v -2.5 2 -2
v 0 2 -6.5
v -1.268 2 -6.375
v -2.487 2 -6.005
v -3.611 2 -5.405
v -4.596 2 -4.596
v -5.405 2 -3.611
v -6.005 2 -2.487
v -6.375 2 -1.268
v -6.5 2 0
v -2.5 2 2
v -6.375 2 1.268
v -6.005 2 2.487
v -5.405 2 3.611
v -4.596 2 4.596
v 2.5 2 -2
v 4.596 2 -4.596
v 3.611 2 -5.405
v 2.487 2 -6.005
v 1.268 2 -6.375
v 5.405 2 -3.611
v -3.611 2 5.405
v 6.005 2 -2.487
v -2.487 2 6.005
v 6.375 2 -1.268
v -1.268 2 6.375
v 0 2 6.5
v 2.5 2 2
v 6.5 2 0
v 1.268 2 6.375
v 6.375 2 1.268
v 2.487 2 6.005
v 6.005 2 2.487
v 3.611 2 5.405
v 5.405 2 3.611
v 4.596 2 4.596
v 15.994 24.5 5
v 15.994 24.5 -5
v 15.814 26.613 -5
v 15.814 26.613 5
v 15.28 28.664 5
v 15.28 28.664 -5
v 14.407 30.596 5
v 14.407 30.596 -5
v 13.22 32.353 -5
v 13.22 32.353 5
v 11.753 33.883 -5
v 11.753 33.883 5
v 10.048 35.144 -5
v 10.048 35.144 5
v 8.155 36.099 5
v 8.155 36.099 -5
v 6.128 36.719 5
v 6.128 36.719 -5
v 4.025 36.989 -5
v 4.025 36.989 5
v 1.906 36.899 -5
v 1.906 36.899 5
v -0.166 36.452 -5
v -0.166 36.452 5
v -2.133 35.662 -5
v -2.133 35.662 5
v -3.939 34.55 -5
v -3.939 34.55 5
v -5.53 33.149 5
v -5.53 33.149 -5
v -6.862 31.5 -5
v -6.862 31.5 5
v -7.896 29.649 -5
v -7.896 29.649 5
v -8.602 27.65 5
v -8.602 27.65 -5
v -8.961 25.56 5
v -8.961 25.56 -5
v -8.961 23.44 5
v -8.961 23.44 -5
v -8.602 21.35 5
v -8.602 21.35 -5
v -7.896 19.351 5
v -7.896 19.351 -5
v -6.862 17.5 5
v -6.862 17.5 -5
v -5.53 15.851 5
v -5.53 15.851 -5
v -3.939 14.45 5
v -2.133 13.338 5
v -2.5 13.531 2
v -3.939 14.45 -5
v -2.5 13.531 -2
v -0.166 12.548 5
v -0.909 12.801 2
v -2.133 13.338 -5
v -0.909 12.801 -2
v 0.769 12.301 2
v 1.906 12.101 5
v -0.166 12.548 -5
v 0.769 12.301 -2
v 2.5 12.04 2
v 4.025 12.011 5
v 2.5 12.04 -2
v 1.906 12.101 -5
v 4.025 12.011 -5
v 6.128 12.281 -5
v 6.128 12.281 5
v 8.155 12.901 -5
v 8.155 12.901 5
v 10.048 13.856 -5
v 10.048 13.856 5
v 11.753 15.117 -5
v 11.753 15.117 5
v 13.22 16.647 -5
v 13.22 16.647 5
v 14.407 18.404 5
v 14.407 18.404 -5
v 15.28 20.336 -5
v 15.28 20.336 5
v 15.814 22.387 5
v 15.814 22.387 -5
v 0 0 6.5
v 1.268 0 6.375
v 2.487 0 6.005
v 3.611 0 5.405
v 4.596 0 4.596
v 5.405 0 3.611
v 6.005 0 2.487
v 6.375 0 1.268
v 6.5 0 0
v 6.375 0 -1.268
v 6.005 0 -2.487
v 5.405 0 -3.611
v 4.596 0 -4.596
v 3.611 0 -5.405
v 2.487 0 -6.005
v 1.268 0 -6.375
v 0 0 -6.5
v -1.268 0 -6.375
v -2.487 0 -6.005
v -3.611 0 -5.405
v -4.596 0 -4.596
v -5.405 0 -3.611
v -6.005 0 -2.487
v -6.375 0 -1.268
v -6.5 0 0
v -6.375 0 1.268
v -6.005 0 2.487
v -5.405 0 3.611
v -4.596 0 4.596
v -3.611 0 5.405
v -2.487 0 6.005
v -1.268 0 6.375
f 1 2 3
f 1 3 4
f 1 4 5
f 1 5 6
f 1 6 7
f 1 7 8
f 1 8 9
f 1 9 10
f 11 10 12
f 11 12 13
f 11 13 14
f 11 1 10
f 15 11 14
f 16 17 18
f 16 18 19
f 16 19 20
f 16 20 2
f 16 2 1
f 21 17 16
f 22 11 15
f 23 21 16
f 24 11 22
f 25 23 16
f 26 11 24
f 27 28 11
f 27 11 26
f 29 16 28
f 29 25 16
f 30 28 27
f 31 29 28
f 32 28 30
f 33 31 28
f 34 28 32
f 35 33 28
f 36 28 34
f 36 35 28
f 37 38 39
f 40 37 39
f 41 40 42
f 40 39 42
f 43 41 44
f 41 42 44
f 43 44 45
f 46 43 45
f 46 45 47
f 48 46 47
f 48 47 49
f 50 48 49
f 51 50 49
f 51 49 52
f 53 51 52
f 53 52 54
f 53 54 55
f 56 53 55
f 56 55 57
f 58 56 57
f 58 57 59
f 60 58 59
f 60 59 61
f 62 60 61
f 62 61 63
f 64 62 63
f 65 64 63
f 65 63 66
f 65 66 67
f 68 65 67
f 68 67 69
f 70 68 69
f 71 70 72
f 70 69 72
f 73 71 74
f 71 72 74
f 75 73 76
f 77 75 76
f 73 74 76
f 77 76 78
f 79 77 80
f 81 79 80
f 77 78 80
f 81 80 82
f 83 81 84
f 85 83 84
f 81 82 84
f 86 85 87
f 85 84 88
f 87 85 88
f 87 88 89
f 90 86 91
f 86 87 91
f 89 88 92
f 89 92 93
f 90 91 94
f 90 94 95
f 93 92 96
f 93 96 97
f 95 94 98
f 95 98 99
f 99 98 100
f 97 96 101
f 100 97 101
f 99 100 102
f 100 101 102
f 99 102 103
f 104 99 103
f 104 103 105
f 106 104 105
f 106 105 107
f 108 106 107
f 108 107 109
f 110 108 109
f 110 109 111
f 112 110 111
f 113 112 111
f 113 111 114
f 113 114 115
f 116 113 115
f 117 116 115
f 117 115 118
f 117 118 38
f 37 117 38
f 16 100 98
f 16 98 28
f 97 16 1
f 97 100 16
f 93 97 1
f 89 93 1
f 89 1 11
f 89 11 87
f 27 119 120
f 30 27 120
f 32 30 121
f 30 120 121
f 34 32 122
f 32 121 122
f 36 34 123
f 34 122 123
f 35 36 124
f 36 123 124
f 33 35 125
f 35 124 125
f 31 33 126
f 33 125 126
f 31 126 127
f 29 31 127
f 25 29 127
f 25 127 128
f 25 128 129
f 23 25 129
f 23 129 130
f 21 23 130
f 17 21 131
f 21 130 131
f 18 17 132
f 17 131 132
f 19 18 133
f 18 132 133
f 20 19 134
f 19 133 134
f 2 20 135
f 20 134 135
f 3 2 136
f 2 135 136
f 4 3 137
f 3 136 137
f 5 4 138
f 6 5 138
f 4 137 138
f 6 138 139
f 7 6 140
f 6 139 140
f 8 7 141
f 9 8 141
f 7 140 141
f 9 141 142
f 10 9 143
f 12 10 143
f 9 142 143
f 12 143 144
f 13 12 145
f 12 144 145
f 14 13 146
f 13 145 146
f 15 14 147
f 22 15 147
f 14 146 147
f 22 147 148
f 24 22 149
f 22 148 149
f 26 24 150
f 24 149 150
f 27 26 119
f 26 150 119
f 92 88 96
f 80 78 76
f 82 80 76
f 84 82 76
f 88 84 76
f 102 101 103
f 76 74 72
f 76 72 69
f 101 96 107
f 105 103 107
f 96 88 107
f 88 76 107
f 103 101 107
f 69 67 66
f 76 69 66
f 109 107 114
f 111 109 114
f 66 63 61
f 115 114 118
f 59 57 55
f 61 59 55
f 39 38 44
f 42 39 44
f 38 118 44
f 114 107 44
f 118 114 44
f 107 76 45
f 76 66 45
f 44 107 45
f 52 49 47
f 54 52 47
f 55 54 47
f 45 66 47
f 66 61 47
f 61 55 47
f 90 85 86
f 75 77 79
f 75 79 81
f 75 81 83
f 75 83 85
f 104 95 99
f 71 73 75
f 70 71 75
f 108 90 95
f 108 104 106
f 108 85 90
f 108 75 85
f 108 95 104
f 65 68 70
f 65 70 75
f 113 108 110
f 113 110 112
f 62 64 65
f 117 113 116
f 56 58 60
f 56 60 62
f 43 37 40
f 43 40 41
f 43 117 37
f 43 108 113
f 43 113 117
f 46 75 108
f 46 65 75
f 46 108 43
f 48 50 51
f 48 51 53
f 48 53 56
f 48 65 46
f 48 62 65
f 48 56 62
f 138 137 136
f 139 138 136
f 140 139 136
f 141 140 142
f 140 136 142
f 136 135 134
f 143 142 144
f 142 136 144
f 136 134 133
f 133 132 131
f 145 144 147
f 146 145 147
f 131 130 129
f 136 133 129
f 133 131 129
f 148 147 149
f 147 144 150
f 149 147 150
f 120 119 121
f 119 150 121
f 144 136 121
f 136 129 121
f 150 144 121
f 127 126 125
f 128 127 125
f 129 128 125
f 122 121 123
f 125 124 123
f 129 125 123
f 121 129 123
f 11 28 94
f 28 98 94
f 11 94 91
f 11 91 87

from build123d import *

# Parameters (mm, degrees)
SKETCH1_R                = 6.5
BOSS_EXTRUDE1_DEPTH      = 2
BOSS_EXTRUDE2_DEPTH      = 2
BOSS_EXTRUDE2_DEPTH_BACK = 2
BOSS_EXTRUDE3_DEPTH      = 5
BOSS_EXTRUDE3_DEPTH_BACK = 5
SKETCH3_R                = 12.5


with BuildPart() as part:
    # Sketch1 → Boss-Extrude1 (new body)
    with BuildSketch(Plane(origin=(0, 0, 0), x_dir=(1, 0, 0), z_dir=(0, 1, 0))):
        Circle(SKETCH1_R)
    extrude(amount=BOSS_EXTRUDE1_DEPTH)

    # Sketch2 → Boss-Extrude2 (add, two sides: drawn at the far end of the back side and taken through both)
    with BuildSketch(Plane.XY.offset(-BOSS_EXTRUDE2_DEPTH_BACK)):
        with BuildLine():
            Line((-2.5, 2), (-2.5, 21.005808669))
            ThreePointArc((-2.5, 21.005808669), (-0.744342007, 25.244342007), (3.494191331, 27))
            ThreePointArc((3.494191331, 27), (5.994191331, 24.5), (3.494191331, 22))
            ThreePointArc((3.494191331, 22), (2.791191899, 21.708808101), (2.5, 21.005808669))
            Line((2.5, 21.005808669), (2.5, 2))
            Line((2.5, 2), (-2.5, 2))
        make_face()
    extrude(amount=BOSS_EXTRUDE2_DEPTH + BOSS_EXTRUDE2_DEPTH_BACK)

    # Sketch3 → Boss-Extrude3 (add, two sides: drawn at the far end of the back side and taken through both)
    with BuildSketch(Plane.XY.offset(-BOSS_EXTRUDE3_DEPTH_BACK)):
        with Locations((3.494191331, 24.5)):
            Circle(SKETCH3_R)
    extrude(amount=BOSS_EXTRUDE3_DEPTH + BOSS_EXTRUDE3_DEPTH_BACK)


solid = part.part
